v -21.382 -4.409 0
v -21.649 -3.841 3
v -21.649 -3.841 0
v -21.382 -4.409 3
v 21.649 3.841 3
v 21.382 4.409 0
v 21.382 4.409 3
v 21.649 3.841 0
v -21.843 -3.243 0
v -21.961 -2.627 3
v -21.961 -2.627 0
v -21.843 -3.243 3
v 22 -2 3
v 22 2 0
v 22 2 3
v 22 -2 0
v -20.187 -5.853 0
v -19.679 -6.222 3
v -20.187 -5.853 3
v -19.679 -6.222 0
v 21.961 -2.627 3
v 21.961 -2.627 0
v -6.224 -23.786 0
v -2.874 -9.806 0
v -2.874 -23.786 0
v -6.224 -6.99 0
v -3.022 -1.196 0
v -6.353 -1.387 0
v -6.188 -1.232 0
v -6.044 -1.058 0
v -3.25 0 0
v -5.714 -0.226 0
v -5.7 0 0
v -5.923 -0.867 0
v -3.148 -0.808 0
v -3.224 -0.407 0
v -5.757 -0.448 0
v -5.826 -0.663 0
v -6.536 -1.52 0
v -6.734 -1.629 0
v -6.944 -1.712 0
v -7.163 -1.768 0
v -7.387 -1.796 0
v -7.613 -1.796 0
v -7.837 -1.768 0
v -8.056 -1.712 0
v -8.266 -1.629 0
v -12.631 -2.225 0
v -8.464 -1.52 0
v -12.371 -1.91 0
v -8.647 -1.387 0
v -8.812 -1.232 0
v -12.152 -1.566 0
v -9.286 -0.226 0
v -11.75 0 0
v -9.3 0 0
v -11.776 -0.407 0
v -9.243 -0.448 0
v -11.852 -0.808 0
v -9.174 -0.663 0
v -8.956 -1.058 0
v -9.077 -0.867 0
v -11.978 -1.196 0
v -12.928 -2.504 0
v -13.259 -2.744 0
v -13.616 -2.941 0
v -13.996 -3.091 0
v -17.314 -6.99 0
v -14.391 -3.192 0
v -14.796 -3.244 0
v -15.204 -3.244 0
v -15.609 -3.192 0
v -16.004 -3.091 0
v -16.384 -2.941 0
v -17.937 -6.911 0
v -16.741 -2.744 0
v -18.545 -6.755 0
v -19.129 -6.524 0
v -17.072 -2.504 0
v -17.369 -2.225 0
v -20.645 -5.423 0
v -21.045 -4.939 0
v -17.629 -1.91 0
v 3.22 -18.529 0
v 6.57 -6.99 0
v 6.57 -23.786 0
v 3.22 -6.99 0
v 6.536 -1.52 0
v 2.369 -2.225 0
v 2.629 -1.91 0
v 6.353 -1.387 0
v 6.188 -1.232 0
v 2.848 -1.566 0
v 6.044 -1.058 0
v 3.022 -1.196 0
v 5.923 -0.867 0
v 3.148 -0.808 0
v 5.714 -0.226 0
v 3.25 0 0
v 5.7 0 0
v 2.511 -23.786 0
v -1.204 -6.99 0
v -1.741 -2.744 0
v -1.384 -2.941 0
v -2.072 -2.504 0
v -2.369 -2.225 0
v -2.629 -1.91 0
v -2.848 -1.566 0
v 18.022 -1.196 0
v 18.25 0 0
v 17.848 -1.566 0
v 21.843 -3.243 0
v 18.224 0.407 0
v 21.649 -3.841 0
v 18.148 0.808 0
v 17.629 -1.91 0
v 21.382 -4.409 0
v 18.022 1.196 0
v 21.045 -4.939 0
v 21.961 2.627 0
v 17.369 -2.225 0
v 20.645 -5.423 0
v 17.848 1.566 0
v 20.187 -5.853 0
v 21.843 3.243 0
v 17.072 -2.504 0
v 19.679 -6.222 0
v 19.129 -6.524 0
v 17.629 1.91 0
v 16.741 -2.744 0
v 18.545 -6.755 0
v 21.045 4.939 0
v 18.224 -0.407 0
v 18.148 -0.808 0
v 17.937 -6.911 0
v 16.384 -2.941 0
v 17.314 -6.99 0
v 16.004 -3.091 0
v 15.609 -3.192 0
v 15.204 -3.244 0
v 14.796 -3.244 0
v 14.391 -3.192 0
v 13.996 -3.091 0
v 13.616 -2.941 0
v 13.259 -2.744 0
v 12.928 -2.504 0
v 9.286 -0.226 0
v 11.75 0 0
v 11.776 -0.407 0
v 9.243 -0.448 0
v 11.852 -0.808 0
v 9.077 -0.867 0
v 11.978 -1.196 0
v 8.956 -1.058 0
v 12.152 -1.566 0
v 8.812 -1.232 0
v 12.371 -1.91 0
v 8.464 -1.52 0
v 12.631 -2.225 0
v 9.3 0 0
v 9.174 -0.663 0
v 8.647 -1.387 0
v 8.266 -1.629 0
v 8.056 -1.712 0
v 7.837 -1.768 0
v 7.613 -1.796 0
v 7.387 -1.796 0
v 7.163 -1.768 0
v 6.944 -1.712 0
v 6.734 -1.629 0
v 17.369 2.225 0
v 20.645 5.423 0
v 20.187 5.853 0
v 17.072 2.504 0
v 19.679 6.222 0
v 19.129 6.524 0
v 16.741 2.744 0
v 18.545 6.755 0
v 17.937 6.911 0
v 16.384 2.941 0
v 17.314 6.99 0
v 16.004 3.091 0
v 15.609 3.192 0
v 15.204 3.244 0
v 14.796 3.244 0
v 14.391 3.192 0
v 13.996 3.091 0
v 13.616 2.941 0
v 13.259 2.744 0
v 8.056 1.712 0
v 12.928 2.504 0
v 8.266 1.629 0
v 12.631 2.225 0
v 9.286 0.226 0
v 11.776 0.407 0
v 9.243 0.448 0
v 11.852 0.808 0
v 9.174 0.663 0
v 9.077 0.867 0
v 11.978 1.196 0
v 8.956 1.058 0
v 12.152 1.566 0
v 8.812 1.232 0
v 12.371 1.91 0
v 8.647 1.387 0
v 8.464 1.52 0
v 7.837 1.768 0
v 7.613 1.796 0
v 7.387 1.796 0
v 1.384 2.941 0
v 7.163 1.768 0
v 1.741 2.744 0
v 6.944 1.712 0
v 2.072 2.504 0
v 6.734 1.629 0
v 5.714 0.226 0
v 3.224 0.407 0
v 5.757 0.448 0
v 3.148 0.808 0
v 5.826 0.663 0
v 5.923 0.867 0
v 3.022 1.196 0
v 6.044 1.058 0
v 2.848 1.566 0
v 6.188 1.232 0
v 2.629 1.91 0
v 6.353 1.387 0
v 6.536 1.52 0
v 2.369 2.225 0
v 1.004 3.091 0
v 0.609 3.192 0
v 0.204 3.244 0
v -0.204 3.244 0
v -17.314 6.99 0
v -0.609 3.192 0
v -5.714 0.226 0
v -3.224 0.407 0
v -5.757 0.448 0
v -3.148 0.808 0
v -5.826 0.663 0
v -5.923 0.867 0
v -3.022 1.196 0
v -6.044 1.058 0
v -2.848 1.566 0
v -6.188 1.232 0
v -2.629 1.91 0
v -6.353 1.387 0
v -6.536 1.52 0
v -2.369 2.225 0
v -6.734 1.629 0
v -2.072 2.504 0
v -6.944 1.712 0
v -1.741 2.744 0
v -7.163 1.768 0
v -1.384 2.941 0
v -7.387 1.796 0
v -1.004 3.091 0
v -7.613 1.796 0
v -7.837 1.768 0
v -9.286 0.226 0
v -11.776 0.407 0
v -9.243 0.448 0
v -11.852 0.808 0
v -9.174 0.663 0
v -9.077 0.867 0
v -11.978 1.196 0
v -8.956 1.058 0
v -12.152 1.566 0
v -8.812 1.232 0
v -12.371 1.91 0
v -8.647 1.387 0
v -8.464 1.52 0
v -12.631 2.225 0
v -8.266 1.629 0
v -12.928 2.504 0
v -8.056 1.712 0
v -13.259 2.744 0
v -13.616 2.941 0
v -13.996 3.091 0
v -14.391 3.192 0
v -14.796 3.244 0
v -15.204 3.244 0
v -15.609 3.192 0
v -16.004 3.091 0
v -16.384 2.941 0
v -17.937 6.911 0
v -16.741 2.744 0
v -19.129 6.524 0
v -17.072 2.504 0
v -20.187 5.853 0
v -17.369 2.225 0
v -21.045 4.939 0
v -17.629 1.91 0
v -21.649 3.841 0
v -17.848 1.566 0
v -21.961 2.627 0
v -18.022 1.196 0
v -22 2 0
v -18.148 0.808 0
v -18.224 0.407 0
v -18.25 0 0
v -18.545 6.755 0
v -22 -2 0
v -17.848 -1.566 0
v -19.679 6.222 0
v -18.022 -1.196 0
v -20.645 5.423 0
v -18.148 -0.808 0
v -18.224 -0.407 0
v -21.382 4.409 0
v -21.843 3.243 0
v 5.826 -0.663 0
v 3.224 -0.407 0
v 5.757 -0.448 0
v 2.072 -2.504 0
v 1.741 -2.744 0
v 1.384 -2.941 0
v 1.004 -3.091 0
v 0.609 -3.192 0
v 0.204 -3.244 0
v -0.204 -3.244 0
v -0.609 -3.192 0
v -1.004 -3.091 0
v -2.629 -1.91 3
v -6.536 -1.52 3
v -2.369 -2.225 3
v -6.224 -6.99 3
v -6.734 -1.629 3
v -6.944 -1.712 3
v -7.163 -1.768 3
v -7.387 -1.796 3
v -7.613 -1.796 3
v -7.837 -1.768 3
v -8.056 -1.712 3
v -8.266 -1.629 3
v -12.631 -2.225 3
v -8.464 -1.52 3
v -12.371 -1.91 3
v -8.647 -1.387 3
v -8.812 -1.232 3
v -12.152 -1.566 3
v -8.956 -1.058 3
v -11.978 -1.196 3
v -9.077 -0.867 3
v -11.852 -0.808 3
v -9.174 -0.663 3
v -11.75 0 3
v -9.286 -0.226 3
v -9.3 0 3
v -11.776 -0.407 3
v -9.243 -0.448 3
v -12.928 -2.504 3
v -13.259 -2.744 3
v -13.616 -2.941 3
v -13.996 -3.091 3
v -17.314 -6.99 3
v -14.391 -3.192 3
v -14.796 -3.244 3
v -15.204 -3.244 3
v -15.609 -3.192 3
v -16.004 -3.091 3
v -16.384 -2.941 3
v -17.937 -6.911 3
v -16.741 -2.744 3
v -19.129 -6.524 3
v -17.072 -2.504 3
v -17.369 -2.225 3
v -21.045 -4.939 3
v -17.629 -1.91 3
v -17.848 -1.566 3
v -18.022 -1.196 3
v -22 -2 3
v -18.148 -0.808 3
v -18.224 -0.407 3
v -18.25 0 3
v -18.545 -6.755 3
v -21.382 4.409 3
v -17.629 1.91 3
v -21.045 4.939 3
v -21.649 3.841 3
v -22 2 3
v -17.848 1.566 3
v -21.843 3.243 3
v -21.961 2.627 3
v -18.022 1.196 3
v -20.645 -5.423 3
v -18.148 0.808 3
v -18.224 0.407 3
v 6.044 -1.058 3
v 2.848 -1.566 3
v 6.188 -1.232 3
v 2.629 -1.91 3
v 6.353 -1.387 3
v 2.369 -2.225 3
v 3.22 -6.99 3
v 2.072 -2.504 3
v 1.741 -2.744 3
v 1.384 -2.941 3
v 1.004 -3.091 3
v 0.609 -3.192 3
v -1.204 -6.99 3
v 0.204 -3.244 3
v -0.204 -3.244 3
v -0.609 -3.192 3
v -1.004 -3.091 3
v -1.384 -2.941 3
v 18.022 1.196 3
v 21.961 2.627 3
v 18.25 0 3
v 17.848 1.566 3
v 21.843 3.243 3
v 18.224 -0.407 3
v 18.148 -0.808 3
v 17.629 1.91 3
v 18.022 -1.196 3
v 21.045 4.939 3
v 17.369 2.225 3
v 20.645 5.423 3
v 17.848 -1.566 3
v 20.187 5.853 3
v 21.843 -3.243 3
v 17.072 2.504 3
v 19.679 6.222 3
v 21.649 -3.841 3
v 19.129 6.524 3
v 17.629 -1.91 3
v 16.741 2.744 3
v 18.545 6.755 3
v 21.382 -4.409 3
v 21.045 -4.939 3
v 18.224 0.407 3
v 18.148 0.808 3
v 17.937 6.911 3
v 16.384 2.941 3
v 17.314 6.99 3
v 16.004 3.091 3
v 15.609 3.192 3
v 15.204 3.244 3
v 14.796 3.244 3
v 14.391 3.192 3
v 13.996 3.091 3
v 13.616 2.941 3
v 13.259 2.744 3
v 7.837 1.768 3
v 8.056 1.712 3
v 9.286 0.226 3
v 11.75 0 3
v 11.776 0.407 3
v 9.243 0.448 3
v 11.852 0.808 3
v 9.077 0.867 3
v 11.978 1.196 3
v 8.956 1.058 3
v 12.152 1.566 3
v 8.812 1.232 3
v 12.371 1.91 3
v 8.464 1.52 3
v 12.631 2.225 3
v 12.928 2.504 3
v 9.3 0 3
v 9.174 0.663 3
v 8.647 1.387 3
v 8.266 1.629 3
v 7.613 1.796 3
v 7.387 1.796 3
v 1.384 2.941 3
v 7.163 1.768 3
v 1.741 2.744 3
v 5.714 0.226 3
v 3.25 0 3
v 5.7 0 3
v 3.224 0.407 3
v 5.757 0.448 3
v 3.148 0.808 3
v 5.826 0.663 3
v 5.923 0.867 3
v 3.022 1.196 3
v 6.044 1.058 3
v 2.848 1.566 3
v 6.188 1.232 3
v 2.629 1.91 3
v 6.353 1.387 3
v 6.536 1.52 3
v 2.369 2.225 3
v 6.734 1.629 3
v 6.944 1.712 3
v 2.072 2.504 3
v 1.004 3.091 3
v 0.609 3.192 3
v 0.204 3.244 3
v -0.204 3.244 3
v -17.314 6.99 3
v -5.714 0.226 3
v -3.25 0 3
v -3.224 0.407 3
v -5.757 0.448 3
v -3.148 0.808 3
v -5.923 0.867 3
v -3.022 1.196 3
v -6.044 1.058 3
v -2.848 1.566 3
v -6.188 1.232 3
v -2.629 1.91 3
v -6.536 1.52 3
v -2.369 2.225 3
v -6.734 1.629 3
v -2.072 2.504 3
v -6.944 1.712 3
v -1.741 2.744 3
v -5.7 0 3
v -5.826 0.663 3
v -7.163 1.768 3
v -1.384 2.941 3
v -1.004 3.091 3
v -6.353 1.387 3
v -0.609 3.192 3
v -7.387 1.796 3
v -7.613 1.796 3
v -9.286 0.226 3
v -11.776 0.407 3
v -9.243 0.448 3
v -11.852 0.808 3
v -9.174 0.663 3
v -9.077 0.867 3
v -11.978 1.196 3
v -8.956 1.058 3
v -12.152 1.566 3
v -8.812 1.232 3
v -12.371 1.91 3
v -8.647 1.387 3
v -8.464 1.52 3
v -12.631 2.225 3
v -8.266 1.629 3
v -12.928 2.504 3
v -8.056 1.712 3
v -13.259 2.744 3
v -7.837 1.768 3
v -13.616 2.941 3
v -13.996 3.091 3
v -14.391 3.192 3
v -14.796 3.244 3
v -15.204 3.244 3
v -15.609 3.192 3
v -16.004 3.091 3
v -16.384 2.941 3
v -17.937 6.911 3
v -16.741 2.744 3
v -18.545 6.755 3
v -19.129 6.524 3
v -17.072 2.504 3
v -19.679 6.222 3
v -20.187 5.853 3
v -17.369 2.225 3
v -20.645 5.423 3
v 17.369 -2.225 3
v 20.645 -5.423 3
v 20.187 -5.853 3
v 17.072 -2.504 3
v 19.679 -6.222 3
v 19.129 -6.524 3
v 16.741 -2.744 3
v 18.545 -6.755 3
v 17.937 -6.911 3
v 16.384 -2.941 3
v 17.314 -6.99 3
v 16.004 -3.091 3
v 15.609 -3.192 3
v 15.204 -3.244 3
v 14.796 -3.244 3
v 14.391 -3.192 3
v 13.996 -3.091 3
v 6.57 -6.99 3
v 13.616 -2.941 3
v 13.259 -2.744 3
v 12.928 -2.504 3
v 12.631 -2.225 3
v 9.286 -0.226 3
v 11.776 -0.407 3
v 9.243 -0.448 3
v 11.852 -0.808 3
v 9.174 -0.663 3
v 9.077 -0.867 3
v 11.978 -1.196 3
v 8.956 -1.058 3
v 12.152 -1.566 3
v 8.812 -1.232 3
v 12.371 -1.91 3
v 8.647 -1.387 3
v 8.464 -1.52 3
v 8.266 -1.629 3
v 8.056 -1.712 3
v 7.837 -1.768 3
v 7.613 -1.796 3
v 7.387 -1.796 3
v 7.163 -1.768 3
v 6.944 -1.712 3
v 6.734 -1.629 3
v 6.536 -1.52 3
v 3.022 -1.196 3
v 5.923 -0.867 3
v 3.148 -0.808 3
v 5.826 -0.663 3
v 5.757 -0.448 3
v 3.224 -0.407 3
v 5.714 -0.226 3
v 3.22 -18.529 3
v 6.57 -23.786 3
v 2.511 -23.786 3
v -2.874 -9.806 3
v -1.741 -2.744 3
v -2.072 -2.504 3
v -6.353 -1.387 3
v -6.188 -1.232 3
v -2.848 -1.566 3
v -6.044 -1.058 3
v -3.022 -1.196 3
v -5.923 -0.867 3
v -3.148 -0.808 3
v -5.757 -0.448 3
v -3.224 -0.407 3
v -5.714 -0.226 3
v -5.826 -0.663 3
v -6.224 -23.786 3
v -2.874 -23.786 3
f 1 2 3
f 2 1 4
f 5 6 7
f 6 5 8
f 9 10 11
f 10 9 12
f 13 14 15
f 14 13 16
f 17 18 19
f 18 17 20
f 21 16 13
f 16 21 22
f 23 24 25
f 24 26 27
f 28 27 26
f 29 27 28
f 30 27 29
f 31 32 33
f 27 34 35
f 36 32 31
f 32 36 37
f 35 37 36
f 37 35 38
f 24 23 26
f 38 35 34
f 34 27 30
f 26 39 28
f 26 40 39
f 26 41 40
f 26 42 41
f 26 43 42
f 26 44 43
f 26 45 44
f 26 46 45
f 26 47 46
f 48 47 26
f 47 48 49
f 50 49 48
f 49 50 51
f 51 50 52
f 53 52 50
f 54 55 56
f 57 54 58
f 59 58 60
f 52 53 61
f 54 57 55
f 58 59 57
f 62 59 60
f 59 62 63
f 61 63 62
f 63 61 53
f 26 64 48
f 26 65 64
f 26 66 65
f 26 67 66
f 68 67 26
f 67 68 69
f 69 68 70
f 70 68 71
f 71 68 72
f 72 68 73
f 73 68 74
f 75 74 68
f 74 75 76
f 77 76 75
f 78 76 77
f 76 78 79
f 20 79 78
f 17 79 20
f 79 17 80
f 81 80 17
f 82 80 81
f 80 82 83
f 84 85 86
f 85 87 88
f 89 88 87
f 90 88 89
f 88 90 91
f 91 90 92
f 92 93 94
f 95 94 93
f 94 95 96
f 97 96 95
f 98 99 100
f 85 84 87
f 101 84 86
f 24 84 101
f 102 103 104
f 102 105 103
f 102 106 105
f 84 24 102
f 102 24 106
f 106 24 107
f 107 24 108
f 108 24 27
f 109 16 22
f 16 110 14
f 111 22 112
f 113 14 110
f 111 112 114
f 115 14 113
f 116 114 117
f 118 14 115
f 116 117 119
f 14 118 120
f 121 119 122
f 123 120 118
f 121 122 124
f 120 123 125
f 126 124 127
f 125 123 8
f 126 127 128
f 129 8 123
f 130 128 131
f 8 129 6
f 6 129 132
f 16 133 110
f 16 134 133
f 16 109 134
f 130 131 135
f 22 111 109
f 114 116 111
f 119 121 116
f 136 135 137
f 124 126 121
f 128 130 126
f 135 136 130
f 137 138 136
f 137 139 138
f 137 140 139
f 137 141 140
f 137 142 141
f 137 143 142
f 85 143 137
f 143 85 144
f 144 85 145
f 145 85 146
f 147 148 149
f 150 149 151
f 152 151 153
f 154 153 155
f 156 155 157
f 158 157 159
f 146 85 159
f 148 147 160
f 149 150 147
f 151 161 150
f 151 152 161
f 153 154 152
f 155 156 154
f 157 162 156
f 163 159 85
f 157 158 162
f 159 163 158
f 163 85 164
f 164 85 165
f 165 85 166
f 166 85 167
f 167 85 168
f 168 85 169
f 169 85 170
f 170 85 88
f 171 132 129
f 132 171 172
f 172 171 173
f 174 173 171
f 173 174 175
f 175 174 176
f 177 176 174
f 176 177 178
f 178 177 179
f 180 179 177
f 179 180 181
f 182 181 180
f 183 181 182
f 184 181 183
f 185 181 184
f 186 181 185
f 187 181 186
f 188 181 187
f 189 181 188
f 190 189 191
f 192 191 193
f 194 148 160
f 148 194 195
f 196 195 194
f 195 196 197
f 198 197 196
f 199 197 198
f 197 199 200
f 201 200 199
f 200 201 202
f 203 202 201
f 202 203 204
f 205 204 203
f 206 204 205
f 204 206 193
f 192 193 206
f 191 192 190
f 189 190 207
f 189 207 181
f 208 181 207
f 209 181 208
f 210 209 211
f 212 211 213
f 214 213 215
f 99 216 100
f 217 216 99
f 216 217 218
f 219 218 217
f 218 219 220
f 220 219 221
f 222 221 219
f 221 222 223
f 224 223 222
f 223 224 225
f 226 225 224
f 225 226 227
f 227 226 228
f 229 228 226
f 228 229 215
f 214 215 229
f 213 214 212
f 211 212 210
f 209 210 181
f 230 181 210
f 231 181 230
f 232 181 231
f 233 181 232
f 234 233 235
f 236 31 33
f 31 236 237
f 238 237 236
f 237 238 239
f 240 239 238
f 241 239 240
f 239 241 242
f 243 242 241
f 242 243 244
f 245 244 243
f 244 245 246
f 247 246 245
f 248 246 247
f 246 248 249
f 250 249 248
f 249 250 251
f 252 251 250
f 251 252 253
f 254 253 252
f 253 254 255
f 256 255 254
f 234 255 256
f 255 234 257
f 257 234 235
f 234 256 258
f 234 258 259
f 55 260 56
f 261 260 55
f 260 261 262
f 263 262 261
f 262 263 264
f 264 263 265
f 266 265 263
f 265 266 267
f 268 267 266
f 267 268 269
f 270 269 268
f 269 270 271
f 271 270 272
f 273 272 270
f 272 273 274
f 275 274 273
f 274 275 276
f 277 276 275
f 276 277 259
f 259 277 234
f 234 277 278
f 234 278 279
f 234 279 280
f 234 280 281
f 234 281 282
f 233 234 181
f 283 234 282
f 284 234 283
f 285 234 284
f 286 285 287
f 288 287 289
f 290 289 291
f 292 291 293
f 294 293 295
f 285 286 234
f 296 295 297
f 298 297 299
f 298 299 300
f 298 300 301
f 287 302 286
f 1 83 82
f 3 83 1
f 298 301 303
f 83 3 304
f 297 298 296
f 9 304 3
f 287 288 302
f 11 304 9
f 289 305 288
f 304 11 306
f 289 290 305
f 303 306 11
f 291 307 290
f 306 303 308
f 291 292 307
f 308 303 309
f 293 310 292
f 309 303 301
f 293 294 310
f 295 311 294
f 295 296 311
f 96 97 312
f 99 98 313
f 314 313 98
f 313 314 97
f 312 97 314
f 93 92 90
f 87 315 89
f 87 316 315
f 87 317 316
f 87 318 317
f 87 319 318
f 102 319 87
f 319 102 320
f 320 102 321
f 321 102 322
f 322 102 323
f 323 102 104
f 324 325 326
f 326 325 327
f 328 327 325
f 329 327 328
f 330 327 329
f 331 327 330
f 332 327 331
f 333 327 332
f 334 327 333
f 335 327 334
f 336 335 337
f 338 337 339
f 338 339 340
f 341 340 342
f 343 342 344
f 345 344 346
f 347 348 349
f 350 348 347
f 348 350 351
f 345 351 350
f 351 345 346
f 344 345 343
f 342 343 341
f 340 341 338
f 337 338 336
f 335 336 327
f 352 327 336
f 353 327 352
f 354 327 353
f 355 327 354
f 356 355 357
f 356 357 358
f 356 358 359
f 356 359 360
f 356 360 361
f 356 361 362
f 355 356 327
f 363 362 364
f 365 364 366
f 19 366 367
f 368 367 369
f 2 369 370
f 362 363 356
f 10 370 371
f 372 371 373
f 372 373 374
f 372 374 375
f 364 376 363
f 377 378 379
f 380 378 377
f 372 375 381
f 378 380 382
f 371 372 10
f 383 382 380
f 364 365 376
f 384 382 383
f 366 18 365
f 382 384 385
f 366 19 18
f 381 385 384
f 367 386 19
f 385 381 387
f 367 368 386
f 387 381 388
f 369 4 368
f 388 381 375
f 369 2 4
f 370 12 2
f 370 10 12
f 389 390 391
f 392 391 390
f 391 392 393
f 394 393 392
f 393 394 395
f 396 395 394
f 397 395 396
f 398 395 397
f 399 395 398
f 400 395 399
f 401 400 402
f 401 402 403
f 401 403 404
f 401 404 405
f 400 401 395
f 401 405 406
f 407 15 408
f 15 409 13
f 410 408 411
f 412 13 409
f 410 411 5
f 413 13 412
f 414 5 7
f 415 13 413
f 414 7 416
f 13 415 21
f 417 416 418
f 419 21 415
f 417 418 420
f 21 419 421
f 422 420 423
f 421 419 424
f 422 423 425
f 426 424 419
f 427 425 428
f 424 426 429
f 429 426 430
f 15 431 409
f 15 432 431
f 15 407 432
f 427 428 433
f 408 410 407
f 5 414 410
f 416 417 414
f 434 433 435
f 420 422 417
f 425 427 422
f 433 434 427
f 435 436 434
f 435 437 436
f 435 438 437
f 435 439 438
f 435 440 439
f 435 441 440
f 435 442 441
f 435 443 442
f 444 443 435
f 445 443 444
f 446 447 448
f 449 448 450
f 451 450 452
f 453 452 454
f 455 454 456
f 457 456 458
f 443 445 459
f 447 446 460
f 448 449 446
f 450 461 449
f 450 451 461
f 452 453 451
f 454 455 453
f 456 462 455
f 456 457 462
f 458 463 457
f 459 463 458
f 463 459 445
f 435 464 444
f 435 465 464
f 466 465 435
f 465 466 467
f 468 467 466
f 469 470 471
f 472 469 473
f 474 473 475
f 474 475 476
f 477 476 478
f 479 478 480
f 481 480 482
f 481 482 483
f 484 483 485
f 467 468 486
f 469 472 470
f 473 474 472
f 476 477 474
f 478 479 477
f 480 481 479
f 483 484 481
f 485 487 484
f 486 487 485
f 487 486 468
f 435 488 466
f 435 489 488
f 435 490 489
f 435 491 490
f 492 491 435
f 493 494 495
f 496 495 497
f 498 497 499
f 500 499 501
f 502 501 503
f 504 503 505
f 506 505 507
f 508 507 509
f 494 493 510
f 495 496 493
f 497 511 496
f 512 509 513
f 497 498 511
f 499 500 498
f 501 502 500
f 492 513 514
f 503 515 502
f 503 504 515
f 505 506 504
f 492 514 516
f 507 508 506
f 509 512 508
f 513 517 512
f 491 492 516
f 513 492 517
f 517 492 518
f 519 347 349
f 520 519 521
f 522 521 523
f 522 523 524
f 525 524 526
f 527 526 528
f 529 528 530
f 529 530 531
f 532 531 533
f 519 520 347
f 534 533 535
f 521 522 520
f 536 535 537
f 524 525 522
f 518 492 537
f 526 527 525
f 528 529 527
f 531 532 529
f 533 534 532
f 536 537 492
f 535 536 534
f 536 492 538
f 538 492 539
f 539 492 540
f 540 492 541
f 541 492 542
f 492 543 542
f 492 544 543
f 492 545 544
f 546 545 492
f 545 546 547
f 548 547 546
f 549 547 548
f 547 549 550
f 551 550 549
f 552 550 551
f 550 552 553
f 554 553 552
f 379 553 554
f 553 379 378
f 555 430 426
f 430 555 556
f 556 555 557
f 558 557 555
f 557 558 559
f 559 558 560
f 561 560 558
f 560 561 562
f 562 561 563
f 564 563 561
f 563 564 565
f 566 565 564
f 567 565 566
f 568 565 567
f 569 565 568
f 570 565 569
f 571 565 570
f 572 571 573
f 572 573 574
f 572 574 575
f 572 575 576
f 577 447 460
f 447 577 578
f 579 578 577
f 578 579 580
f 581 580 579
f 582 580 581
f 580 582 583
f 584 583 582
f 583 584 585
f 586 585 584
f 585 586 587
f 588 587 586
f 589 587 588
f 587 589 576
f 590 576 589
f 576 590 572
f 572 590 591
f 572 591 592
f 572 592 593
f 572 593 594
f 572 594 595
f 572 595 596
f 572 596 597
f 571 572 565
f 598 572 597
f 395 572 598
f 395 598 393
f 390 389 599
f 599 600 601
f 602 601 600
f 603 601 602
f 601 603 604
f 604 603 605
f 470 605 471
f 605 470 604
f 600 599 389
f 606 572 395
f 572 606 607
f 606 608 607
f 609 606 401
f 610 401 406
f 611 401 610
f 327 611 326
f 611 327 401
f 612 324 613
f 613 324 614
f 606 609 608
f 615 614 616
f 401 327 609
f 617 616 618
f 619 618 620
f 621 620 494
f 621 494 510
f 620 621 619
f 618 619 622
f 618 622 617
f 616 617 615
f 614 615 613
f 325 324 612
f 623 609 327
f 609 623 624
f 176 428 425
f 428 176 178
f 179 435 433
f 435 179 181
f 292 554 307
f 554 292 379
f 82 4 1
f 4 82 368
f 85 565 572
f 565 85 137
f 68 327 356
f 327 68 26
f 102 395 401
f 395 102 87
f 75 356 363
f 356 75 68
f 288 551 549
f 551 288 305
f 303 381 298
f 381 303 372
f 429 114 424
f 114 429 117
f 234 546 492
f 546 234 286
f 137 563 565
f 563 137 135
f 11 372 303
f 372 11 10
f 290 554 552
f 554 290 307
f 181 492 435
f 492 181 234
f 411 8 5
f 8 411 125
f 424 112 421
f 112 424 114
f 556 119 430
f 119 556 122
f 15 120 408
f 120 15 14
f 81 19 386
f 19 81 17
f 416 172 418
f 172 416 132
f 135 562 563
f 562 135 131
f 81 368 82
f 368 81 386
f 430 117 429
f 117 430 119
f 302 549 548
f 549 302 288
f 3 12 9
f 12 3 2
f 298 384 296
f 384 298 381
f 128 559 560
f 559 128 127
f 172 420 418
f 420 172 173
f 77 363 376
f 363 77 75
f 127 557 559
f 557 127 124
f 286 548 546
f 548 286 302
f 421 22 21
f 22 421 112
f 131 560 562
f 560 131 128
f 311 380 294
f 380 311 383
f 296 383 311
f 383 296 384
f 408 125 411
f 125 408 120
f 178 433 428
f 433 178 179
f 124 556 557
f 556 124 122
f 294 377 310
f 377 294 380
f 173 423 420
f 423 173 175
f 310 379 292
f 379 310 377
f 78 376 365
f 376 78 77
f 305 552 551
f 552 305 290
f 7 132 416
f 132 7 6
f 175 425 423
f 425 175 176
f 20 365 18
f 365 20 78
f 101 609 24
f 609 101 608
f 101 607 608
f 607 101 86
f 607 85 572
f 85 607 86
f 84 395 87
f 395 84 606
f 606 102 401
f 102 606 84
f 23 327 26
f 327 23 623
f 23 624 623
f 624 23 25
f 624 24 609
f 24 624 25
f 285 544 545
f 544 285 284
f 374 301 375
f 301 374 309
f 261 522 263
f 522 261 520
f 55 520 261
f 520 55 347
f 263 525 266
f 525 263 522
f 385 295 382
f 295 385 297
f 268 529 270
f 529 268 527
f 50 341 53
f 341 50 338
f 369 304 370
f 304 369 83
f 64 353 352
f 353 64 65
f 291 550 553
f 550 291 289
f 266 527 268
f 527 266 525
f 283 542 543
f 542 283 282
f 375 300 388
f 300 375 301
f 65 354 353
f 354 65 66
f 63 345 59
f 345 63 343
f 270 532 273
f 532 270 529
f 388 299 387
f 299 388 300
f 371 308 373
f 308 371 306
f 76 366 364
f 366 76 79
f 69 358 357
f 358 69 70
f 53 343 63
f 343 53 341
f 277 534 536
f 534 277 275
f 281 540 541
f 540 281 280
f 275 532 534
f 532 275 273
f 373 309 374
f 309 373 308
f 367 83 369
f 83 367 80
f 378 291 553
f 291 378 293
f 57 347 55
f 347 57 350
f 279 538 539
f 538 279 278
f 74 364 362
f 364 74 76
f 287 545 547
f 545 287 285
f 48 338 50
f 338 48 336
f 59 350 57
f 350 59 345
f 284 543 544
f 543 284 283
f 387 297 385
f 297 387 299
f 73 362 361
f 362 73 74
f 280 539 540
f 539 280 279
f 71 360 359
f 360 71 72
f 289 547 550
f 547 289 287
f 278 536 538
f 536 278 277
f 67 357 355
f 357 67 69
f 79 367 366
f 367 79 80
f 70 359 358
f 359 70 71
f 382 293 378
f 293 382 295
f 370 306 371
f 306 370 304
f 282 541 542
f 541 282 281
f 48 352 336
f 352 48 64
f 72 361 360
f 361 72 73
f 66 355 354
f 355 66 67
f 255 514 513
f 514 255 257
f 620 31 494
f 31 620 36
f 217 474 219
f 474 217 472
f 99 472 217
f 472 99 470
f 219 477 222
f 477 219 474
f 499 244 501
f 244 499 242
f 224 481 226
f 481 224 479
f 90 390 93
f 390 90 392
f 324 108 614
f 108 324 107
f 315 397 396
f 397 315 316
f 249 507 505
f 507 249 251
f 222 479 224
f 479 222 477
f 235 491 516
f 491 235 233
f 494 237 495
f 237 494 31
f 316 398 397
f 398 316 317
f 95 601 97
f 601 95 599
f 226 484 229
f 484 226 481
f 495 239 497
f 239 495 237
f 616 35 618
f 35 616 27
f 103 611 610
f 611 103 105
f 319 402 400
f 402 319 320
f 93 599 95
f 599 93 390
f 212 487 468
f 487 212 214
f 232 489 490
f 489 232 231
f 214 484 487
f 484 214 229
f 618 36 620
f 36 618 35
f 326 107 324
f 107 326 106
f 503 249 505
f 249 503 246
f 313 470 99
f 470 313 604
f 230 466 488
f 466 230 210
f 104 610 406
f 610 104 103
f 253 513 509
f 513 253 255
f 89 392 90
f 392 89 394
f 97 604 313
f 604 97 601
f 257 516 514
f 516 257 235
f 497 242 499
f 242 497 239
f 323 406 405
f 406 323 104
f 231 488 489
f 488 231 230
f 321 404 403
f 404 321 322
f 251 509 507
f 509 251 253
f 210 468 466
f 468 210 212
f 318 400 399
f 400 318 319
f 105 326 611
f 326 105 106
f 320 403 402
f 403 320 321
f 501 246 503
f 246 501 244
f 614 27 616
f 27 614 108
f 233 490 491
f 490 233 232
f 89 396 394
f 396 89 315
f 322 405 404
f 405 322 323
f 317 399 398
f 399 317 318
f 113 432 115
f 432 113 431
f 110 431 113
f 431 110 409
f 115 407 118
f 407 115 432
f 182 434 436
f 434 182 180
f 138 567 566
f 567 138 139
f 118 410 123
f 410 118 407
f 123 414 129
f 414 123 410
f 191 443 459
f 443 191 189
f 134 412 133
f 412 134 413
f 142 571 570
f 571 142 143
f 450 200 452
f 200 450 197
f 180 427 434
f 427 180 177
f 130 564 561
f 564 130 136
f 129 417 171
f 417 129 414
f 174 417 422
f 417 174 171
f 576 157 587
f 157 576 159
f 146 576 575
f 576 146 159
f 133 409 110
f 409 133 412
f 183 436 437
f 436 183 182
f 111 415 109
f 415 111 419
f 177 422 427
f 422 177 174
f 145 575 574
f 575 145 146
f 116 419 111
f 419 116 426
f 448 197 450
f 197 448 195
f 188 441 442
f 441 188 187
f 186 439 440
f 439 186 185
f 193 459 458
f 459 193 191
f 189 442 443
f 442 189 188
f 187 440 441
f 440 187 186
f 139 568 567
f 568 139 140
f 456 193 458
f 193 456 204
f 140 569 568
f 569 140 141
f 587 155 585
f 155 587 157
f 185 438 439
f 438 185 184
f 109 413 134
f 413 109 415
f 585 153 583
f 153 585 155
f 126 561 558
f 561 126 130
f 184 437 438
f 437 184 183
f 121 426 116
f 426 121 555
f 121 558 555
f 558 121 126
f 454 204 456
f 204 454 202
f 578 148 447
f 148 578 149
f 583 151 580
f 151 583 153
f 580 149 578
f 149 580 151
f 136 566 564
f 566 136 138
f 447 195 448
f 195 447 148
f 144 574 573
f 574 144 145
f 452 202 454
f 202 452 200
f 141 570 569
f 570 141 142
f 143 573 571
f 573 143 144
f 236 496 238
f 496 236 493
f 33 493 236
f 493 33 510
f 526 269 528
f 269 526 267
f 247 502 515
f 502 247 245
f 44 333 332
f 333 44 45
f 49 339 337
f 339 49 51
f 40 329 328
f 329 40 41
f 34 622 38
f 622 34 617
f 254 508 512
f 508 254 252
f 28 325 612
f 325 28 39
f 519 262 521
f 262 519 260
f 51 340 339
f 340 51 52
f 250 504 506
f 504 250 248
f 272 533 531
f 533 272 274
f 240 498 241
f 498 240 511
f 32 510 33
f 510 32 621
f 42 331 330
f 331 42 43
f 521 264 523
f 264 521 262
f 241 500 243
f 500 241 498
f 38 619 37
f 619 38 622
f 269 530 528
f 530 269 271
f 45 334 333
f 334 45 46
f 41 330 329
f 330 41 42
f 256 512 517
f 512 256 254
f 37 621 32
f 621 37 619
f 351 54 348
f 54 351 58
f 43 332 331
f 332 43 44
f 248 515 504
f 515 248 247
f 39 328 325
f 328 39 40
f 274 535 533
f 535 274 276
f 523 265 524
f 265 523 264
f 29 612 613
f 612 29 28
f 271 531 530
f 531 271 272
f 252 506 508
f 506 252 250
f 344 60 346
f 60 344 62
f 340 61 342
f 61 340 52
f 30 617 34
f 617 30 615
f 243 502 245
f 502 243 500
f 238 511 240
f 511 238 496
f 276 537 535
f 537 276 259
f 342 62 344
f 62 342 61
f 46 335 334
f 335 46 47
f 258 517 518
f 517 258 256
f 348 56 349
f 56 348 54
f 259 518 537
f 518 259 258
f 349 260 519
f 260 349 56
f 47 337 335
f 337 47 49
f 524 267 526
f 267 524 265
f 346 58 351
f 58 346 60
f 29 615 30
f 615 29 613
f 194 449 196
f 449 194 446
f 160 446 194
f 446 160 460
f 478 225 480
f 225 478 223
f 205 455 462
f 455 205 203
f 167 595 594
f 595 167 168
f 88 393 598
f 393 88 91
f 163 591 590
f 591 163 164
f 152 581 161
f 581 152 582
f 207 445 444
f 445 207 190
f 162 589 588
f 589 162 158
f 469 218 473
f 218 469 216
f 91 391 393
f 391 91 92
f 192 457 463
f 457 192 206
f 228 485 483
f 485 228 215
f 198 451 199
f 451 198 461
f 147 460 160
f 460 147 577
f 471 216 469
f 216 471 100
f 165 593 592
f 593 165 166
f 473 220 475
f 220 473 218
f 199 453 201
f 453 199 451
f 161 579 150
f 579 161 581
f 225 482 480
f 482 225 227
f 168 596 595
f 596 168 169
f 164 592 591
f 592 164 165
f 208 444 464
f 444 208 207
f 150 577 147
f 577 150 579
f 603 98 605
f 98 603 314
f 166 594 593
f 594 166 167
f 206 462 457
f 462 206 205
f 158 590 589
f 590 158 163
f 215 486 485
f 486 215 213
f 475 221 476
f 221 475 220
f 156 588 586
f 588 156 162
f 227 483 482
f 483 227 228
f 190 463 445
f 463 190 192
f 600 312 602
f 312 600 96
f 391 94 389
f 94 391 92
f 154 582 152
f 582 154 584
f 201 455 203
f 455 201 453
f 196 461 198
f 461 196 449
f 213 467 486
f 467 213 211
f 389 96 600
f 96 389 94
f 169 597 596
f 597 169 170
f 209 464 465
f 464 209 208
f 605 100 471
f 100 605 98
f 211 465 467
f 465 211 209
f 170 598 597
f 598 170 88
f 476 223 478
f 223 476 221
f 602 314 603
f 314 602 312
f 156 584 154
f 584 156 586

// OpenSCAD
$fn = 50;


difference() {
	union() {
		hull() {
			translate(v = [-17.0000000000, 2.0000000000, 0]) {
				cylinder(h = 3, r = 5);
			}
			translate(v = [17.0000000000, 2.0000000000, 0]) {
				cylinder(h = 3, r = 5);
			}
			translate(v = [-17.0000000000, -2.0000000000, 0]) {
				cylinder(h = 3, r = 5);
			}
			translate(v = [17.0000000000, -2.0000000000, 0]) {
				cylinder(h = 3, r = 5);
			}
		}
		translate(v = [0, -5, 0]) {
			linear_extrude(height = 3) {
				text(font = "DejaVu Sans Mono:style=Bold", halign = "center", size = 19.0000000000, text = "N", valign = "top");
			}
		}
	}
	union() {
		translate(v = [-15.0000000000, 0.0000000000, 0]) {
			translate(v = [0, 0, -100]) {
				cylinder(h = 200, r = 3.2500000000);
			}
		}
		translate(v = [0, 0, -100]) {
			cylinder(h = 200, r = 3.2500000000);
		}
		translate(v = [15.0000000000, 0.0000000000, 0]) {
			translate(v = [0, 0, -100]) {
				cylinder(h = 200, r = 3.2500000000);
			}
		}
		translate(v = [-15.0000000000, 0.0000000000, 0]) {
			translate(v = [0, 0, -100]) {
				cylinder(h = 200, r = 1.8000000000);
			}
		}
		translate(v = [-7.5000000000, 0.0000000000, 0]) {
			translate(v = [0, 0, -100]) {
				cylinder(h = 200, r = 1.8000000000);
			}
		}
		translate(v = [0, 0, -100]) {
			cylinder(h = 200, r = 1.8000000000);
		}
		translate(v = [7.5000000000, 0.0000000000, 0]) {
			translate(v = [0, 0, -100]) {
				cylinder(h = 200, r = 1.8000000000);
			}
		}
		translate(v = [15.0000000000, 0.0000000000, 0]) {
			translate(v = [0, 0, -100]) {
				cylinder(h = 200, r = 1.8000000000);
			}
		}
	}
}
